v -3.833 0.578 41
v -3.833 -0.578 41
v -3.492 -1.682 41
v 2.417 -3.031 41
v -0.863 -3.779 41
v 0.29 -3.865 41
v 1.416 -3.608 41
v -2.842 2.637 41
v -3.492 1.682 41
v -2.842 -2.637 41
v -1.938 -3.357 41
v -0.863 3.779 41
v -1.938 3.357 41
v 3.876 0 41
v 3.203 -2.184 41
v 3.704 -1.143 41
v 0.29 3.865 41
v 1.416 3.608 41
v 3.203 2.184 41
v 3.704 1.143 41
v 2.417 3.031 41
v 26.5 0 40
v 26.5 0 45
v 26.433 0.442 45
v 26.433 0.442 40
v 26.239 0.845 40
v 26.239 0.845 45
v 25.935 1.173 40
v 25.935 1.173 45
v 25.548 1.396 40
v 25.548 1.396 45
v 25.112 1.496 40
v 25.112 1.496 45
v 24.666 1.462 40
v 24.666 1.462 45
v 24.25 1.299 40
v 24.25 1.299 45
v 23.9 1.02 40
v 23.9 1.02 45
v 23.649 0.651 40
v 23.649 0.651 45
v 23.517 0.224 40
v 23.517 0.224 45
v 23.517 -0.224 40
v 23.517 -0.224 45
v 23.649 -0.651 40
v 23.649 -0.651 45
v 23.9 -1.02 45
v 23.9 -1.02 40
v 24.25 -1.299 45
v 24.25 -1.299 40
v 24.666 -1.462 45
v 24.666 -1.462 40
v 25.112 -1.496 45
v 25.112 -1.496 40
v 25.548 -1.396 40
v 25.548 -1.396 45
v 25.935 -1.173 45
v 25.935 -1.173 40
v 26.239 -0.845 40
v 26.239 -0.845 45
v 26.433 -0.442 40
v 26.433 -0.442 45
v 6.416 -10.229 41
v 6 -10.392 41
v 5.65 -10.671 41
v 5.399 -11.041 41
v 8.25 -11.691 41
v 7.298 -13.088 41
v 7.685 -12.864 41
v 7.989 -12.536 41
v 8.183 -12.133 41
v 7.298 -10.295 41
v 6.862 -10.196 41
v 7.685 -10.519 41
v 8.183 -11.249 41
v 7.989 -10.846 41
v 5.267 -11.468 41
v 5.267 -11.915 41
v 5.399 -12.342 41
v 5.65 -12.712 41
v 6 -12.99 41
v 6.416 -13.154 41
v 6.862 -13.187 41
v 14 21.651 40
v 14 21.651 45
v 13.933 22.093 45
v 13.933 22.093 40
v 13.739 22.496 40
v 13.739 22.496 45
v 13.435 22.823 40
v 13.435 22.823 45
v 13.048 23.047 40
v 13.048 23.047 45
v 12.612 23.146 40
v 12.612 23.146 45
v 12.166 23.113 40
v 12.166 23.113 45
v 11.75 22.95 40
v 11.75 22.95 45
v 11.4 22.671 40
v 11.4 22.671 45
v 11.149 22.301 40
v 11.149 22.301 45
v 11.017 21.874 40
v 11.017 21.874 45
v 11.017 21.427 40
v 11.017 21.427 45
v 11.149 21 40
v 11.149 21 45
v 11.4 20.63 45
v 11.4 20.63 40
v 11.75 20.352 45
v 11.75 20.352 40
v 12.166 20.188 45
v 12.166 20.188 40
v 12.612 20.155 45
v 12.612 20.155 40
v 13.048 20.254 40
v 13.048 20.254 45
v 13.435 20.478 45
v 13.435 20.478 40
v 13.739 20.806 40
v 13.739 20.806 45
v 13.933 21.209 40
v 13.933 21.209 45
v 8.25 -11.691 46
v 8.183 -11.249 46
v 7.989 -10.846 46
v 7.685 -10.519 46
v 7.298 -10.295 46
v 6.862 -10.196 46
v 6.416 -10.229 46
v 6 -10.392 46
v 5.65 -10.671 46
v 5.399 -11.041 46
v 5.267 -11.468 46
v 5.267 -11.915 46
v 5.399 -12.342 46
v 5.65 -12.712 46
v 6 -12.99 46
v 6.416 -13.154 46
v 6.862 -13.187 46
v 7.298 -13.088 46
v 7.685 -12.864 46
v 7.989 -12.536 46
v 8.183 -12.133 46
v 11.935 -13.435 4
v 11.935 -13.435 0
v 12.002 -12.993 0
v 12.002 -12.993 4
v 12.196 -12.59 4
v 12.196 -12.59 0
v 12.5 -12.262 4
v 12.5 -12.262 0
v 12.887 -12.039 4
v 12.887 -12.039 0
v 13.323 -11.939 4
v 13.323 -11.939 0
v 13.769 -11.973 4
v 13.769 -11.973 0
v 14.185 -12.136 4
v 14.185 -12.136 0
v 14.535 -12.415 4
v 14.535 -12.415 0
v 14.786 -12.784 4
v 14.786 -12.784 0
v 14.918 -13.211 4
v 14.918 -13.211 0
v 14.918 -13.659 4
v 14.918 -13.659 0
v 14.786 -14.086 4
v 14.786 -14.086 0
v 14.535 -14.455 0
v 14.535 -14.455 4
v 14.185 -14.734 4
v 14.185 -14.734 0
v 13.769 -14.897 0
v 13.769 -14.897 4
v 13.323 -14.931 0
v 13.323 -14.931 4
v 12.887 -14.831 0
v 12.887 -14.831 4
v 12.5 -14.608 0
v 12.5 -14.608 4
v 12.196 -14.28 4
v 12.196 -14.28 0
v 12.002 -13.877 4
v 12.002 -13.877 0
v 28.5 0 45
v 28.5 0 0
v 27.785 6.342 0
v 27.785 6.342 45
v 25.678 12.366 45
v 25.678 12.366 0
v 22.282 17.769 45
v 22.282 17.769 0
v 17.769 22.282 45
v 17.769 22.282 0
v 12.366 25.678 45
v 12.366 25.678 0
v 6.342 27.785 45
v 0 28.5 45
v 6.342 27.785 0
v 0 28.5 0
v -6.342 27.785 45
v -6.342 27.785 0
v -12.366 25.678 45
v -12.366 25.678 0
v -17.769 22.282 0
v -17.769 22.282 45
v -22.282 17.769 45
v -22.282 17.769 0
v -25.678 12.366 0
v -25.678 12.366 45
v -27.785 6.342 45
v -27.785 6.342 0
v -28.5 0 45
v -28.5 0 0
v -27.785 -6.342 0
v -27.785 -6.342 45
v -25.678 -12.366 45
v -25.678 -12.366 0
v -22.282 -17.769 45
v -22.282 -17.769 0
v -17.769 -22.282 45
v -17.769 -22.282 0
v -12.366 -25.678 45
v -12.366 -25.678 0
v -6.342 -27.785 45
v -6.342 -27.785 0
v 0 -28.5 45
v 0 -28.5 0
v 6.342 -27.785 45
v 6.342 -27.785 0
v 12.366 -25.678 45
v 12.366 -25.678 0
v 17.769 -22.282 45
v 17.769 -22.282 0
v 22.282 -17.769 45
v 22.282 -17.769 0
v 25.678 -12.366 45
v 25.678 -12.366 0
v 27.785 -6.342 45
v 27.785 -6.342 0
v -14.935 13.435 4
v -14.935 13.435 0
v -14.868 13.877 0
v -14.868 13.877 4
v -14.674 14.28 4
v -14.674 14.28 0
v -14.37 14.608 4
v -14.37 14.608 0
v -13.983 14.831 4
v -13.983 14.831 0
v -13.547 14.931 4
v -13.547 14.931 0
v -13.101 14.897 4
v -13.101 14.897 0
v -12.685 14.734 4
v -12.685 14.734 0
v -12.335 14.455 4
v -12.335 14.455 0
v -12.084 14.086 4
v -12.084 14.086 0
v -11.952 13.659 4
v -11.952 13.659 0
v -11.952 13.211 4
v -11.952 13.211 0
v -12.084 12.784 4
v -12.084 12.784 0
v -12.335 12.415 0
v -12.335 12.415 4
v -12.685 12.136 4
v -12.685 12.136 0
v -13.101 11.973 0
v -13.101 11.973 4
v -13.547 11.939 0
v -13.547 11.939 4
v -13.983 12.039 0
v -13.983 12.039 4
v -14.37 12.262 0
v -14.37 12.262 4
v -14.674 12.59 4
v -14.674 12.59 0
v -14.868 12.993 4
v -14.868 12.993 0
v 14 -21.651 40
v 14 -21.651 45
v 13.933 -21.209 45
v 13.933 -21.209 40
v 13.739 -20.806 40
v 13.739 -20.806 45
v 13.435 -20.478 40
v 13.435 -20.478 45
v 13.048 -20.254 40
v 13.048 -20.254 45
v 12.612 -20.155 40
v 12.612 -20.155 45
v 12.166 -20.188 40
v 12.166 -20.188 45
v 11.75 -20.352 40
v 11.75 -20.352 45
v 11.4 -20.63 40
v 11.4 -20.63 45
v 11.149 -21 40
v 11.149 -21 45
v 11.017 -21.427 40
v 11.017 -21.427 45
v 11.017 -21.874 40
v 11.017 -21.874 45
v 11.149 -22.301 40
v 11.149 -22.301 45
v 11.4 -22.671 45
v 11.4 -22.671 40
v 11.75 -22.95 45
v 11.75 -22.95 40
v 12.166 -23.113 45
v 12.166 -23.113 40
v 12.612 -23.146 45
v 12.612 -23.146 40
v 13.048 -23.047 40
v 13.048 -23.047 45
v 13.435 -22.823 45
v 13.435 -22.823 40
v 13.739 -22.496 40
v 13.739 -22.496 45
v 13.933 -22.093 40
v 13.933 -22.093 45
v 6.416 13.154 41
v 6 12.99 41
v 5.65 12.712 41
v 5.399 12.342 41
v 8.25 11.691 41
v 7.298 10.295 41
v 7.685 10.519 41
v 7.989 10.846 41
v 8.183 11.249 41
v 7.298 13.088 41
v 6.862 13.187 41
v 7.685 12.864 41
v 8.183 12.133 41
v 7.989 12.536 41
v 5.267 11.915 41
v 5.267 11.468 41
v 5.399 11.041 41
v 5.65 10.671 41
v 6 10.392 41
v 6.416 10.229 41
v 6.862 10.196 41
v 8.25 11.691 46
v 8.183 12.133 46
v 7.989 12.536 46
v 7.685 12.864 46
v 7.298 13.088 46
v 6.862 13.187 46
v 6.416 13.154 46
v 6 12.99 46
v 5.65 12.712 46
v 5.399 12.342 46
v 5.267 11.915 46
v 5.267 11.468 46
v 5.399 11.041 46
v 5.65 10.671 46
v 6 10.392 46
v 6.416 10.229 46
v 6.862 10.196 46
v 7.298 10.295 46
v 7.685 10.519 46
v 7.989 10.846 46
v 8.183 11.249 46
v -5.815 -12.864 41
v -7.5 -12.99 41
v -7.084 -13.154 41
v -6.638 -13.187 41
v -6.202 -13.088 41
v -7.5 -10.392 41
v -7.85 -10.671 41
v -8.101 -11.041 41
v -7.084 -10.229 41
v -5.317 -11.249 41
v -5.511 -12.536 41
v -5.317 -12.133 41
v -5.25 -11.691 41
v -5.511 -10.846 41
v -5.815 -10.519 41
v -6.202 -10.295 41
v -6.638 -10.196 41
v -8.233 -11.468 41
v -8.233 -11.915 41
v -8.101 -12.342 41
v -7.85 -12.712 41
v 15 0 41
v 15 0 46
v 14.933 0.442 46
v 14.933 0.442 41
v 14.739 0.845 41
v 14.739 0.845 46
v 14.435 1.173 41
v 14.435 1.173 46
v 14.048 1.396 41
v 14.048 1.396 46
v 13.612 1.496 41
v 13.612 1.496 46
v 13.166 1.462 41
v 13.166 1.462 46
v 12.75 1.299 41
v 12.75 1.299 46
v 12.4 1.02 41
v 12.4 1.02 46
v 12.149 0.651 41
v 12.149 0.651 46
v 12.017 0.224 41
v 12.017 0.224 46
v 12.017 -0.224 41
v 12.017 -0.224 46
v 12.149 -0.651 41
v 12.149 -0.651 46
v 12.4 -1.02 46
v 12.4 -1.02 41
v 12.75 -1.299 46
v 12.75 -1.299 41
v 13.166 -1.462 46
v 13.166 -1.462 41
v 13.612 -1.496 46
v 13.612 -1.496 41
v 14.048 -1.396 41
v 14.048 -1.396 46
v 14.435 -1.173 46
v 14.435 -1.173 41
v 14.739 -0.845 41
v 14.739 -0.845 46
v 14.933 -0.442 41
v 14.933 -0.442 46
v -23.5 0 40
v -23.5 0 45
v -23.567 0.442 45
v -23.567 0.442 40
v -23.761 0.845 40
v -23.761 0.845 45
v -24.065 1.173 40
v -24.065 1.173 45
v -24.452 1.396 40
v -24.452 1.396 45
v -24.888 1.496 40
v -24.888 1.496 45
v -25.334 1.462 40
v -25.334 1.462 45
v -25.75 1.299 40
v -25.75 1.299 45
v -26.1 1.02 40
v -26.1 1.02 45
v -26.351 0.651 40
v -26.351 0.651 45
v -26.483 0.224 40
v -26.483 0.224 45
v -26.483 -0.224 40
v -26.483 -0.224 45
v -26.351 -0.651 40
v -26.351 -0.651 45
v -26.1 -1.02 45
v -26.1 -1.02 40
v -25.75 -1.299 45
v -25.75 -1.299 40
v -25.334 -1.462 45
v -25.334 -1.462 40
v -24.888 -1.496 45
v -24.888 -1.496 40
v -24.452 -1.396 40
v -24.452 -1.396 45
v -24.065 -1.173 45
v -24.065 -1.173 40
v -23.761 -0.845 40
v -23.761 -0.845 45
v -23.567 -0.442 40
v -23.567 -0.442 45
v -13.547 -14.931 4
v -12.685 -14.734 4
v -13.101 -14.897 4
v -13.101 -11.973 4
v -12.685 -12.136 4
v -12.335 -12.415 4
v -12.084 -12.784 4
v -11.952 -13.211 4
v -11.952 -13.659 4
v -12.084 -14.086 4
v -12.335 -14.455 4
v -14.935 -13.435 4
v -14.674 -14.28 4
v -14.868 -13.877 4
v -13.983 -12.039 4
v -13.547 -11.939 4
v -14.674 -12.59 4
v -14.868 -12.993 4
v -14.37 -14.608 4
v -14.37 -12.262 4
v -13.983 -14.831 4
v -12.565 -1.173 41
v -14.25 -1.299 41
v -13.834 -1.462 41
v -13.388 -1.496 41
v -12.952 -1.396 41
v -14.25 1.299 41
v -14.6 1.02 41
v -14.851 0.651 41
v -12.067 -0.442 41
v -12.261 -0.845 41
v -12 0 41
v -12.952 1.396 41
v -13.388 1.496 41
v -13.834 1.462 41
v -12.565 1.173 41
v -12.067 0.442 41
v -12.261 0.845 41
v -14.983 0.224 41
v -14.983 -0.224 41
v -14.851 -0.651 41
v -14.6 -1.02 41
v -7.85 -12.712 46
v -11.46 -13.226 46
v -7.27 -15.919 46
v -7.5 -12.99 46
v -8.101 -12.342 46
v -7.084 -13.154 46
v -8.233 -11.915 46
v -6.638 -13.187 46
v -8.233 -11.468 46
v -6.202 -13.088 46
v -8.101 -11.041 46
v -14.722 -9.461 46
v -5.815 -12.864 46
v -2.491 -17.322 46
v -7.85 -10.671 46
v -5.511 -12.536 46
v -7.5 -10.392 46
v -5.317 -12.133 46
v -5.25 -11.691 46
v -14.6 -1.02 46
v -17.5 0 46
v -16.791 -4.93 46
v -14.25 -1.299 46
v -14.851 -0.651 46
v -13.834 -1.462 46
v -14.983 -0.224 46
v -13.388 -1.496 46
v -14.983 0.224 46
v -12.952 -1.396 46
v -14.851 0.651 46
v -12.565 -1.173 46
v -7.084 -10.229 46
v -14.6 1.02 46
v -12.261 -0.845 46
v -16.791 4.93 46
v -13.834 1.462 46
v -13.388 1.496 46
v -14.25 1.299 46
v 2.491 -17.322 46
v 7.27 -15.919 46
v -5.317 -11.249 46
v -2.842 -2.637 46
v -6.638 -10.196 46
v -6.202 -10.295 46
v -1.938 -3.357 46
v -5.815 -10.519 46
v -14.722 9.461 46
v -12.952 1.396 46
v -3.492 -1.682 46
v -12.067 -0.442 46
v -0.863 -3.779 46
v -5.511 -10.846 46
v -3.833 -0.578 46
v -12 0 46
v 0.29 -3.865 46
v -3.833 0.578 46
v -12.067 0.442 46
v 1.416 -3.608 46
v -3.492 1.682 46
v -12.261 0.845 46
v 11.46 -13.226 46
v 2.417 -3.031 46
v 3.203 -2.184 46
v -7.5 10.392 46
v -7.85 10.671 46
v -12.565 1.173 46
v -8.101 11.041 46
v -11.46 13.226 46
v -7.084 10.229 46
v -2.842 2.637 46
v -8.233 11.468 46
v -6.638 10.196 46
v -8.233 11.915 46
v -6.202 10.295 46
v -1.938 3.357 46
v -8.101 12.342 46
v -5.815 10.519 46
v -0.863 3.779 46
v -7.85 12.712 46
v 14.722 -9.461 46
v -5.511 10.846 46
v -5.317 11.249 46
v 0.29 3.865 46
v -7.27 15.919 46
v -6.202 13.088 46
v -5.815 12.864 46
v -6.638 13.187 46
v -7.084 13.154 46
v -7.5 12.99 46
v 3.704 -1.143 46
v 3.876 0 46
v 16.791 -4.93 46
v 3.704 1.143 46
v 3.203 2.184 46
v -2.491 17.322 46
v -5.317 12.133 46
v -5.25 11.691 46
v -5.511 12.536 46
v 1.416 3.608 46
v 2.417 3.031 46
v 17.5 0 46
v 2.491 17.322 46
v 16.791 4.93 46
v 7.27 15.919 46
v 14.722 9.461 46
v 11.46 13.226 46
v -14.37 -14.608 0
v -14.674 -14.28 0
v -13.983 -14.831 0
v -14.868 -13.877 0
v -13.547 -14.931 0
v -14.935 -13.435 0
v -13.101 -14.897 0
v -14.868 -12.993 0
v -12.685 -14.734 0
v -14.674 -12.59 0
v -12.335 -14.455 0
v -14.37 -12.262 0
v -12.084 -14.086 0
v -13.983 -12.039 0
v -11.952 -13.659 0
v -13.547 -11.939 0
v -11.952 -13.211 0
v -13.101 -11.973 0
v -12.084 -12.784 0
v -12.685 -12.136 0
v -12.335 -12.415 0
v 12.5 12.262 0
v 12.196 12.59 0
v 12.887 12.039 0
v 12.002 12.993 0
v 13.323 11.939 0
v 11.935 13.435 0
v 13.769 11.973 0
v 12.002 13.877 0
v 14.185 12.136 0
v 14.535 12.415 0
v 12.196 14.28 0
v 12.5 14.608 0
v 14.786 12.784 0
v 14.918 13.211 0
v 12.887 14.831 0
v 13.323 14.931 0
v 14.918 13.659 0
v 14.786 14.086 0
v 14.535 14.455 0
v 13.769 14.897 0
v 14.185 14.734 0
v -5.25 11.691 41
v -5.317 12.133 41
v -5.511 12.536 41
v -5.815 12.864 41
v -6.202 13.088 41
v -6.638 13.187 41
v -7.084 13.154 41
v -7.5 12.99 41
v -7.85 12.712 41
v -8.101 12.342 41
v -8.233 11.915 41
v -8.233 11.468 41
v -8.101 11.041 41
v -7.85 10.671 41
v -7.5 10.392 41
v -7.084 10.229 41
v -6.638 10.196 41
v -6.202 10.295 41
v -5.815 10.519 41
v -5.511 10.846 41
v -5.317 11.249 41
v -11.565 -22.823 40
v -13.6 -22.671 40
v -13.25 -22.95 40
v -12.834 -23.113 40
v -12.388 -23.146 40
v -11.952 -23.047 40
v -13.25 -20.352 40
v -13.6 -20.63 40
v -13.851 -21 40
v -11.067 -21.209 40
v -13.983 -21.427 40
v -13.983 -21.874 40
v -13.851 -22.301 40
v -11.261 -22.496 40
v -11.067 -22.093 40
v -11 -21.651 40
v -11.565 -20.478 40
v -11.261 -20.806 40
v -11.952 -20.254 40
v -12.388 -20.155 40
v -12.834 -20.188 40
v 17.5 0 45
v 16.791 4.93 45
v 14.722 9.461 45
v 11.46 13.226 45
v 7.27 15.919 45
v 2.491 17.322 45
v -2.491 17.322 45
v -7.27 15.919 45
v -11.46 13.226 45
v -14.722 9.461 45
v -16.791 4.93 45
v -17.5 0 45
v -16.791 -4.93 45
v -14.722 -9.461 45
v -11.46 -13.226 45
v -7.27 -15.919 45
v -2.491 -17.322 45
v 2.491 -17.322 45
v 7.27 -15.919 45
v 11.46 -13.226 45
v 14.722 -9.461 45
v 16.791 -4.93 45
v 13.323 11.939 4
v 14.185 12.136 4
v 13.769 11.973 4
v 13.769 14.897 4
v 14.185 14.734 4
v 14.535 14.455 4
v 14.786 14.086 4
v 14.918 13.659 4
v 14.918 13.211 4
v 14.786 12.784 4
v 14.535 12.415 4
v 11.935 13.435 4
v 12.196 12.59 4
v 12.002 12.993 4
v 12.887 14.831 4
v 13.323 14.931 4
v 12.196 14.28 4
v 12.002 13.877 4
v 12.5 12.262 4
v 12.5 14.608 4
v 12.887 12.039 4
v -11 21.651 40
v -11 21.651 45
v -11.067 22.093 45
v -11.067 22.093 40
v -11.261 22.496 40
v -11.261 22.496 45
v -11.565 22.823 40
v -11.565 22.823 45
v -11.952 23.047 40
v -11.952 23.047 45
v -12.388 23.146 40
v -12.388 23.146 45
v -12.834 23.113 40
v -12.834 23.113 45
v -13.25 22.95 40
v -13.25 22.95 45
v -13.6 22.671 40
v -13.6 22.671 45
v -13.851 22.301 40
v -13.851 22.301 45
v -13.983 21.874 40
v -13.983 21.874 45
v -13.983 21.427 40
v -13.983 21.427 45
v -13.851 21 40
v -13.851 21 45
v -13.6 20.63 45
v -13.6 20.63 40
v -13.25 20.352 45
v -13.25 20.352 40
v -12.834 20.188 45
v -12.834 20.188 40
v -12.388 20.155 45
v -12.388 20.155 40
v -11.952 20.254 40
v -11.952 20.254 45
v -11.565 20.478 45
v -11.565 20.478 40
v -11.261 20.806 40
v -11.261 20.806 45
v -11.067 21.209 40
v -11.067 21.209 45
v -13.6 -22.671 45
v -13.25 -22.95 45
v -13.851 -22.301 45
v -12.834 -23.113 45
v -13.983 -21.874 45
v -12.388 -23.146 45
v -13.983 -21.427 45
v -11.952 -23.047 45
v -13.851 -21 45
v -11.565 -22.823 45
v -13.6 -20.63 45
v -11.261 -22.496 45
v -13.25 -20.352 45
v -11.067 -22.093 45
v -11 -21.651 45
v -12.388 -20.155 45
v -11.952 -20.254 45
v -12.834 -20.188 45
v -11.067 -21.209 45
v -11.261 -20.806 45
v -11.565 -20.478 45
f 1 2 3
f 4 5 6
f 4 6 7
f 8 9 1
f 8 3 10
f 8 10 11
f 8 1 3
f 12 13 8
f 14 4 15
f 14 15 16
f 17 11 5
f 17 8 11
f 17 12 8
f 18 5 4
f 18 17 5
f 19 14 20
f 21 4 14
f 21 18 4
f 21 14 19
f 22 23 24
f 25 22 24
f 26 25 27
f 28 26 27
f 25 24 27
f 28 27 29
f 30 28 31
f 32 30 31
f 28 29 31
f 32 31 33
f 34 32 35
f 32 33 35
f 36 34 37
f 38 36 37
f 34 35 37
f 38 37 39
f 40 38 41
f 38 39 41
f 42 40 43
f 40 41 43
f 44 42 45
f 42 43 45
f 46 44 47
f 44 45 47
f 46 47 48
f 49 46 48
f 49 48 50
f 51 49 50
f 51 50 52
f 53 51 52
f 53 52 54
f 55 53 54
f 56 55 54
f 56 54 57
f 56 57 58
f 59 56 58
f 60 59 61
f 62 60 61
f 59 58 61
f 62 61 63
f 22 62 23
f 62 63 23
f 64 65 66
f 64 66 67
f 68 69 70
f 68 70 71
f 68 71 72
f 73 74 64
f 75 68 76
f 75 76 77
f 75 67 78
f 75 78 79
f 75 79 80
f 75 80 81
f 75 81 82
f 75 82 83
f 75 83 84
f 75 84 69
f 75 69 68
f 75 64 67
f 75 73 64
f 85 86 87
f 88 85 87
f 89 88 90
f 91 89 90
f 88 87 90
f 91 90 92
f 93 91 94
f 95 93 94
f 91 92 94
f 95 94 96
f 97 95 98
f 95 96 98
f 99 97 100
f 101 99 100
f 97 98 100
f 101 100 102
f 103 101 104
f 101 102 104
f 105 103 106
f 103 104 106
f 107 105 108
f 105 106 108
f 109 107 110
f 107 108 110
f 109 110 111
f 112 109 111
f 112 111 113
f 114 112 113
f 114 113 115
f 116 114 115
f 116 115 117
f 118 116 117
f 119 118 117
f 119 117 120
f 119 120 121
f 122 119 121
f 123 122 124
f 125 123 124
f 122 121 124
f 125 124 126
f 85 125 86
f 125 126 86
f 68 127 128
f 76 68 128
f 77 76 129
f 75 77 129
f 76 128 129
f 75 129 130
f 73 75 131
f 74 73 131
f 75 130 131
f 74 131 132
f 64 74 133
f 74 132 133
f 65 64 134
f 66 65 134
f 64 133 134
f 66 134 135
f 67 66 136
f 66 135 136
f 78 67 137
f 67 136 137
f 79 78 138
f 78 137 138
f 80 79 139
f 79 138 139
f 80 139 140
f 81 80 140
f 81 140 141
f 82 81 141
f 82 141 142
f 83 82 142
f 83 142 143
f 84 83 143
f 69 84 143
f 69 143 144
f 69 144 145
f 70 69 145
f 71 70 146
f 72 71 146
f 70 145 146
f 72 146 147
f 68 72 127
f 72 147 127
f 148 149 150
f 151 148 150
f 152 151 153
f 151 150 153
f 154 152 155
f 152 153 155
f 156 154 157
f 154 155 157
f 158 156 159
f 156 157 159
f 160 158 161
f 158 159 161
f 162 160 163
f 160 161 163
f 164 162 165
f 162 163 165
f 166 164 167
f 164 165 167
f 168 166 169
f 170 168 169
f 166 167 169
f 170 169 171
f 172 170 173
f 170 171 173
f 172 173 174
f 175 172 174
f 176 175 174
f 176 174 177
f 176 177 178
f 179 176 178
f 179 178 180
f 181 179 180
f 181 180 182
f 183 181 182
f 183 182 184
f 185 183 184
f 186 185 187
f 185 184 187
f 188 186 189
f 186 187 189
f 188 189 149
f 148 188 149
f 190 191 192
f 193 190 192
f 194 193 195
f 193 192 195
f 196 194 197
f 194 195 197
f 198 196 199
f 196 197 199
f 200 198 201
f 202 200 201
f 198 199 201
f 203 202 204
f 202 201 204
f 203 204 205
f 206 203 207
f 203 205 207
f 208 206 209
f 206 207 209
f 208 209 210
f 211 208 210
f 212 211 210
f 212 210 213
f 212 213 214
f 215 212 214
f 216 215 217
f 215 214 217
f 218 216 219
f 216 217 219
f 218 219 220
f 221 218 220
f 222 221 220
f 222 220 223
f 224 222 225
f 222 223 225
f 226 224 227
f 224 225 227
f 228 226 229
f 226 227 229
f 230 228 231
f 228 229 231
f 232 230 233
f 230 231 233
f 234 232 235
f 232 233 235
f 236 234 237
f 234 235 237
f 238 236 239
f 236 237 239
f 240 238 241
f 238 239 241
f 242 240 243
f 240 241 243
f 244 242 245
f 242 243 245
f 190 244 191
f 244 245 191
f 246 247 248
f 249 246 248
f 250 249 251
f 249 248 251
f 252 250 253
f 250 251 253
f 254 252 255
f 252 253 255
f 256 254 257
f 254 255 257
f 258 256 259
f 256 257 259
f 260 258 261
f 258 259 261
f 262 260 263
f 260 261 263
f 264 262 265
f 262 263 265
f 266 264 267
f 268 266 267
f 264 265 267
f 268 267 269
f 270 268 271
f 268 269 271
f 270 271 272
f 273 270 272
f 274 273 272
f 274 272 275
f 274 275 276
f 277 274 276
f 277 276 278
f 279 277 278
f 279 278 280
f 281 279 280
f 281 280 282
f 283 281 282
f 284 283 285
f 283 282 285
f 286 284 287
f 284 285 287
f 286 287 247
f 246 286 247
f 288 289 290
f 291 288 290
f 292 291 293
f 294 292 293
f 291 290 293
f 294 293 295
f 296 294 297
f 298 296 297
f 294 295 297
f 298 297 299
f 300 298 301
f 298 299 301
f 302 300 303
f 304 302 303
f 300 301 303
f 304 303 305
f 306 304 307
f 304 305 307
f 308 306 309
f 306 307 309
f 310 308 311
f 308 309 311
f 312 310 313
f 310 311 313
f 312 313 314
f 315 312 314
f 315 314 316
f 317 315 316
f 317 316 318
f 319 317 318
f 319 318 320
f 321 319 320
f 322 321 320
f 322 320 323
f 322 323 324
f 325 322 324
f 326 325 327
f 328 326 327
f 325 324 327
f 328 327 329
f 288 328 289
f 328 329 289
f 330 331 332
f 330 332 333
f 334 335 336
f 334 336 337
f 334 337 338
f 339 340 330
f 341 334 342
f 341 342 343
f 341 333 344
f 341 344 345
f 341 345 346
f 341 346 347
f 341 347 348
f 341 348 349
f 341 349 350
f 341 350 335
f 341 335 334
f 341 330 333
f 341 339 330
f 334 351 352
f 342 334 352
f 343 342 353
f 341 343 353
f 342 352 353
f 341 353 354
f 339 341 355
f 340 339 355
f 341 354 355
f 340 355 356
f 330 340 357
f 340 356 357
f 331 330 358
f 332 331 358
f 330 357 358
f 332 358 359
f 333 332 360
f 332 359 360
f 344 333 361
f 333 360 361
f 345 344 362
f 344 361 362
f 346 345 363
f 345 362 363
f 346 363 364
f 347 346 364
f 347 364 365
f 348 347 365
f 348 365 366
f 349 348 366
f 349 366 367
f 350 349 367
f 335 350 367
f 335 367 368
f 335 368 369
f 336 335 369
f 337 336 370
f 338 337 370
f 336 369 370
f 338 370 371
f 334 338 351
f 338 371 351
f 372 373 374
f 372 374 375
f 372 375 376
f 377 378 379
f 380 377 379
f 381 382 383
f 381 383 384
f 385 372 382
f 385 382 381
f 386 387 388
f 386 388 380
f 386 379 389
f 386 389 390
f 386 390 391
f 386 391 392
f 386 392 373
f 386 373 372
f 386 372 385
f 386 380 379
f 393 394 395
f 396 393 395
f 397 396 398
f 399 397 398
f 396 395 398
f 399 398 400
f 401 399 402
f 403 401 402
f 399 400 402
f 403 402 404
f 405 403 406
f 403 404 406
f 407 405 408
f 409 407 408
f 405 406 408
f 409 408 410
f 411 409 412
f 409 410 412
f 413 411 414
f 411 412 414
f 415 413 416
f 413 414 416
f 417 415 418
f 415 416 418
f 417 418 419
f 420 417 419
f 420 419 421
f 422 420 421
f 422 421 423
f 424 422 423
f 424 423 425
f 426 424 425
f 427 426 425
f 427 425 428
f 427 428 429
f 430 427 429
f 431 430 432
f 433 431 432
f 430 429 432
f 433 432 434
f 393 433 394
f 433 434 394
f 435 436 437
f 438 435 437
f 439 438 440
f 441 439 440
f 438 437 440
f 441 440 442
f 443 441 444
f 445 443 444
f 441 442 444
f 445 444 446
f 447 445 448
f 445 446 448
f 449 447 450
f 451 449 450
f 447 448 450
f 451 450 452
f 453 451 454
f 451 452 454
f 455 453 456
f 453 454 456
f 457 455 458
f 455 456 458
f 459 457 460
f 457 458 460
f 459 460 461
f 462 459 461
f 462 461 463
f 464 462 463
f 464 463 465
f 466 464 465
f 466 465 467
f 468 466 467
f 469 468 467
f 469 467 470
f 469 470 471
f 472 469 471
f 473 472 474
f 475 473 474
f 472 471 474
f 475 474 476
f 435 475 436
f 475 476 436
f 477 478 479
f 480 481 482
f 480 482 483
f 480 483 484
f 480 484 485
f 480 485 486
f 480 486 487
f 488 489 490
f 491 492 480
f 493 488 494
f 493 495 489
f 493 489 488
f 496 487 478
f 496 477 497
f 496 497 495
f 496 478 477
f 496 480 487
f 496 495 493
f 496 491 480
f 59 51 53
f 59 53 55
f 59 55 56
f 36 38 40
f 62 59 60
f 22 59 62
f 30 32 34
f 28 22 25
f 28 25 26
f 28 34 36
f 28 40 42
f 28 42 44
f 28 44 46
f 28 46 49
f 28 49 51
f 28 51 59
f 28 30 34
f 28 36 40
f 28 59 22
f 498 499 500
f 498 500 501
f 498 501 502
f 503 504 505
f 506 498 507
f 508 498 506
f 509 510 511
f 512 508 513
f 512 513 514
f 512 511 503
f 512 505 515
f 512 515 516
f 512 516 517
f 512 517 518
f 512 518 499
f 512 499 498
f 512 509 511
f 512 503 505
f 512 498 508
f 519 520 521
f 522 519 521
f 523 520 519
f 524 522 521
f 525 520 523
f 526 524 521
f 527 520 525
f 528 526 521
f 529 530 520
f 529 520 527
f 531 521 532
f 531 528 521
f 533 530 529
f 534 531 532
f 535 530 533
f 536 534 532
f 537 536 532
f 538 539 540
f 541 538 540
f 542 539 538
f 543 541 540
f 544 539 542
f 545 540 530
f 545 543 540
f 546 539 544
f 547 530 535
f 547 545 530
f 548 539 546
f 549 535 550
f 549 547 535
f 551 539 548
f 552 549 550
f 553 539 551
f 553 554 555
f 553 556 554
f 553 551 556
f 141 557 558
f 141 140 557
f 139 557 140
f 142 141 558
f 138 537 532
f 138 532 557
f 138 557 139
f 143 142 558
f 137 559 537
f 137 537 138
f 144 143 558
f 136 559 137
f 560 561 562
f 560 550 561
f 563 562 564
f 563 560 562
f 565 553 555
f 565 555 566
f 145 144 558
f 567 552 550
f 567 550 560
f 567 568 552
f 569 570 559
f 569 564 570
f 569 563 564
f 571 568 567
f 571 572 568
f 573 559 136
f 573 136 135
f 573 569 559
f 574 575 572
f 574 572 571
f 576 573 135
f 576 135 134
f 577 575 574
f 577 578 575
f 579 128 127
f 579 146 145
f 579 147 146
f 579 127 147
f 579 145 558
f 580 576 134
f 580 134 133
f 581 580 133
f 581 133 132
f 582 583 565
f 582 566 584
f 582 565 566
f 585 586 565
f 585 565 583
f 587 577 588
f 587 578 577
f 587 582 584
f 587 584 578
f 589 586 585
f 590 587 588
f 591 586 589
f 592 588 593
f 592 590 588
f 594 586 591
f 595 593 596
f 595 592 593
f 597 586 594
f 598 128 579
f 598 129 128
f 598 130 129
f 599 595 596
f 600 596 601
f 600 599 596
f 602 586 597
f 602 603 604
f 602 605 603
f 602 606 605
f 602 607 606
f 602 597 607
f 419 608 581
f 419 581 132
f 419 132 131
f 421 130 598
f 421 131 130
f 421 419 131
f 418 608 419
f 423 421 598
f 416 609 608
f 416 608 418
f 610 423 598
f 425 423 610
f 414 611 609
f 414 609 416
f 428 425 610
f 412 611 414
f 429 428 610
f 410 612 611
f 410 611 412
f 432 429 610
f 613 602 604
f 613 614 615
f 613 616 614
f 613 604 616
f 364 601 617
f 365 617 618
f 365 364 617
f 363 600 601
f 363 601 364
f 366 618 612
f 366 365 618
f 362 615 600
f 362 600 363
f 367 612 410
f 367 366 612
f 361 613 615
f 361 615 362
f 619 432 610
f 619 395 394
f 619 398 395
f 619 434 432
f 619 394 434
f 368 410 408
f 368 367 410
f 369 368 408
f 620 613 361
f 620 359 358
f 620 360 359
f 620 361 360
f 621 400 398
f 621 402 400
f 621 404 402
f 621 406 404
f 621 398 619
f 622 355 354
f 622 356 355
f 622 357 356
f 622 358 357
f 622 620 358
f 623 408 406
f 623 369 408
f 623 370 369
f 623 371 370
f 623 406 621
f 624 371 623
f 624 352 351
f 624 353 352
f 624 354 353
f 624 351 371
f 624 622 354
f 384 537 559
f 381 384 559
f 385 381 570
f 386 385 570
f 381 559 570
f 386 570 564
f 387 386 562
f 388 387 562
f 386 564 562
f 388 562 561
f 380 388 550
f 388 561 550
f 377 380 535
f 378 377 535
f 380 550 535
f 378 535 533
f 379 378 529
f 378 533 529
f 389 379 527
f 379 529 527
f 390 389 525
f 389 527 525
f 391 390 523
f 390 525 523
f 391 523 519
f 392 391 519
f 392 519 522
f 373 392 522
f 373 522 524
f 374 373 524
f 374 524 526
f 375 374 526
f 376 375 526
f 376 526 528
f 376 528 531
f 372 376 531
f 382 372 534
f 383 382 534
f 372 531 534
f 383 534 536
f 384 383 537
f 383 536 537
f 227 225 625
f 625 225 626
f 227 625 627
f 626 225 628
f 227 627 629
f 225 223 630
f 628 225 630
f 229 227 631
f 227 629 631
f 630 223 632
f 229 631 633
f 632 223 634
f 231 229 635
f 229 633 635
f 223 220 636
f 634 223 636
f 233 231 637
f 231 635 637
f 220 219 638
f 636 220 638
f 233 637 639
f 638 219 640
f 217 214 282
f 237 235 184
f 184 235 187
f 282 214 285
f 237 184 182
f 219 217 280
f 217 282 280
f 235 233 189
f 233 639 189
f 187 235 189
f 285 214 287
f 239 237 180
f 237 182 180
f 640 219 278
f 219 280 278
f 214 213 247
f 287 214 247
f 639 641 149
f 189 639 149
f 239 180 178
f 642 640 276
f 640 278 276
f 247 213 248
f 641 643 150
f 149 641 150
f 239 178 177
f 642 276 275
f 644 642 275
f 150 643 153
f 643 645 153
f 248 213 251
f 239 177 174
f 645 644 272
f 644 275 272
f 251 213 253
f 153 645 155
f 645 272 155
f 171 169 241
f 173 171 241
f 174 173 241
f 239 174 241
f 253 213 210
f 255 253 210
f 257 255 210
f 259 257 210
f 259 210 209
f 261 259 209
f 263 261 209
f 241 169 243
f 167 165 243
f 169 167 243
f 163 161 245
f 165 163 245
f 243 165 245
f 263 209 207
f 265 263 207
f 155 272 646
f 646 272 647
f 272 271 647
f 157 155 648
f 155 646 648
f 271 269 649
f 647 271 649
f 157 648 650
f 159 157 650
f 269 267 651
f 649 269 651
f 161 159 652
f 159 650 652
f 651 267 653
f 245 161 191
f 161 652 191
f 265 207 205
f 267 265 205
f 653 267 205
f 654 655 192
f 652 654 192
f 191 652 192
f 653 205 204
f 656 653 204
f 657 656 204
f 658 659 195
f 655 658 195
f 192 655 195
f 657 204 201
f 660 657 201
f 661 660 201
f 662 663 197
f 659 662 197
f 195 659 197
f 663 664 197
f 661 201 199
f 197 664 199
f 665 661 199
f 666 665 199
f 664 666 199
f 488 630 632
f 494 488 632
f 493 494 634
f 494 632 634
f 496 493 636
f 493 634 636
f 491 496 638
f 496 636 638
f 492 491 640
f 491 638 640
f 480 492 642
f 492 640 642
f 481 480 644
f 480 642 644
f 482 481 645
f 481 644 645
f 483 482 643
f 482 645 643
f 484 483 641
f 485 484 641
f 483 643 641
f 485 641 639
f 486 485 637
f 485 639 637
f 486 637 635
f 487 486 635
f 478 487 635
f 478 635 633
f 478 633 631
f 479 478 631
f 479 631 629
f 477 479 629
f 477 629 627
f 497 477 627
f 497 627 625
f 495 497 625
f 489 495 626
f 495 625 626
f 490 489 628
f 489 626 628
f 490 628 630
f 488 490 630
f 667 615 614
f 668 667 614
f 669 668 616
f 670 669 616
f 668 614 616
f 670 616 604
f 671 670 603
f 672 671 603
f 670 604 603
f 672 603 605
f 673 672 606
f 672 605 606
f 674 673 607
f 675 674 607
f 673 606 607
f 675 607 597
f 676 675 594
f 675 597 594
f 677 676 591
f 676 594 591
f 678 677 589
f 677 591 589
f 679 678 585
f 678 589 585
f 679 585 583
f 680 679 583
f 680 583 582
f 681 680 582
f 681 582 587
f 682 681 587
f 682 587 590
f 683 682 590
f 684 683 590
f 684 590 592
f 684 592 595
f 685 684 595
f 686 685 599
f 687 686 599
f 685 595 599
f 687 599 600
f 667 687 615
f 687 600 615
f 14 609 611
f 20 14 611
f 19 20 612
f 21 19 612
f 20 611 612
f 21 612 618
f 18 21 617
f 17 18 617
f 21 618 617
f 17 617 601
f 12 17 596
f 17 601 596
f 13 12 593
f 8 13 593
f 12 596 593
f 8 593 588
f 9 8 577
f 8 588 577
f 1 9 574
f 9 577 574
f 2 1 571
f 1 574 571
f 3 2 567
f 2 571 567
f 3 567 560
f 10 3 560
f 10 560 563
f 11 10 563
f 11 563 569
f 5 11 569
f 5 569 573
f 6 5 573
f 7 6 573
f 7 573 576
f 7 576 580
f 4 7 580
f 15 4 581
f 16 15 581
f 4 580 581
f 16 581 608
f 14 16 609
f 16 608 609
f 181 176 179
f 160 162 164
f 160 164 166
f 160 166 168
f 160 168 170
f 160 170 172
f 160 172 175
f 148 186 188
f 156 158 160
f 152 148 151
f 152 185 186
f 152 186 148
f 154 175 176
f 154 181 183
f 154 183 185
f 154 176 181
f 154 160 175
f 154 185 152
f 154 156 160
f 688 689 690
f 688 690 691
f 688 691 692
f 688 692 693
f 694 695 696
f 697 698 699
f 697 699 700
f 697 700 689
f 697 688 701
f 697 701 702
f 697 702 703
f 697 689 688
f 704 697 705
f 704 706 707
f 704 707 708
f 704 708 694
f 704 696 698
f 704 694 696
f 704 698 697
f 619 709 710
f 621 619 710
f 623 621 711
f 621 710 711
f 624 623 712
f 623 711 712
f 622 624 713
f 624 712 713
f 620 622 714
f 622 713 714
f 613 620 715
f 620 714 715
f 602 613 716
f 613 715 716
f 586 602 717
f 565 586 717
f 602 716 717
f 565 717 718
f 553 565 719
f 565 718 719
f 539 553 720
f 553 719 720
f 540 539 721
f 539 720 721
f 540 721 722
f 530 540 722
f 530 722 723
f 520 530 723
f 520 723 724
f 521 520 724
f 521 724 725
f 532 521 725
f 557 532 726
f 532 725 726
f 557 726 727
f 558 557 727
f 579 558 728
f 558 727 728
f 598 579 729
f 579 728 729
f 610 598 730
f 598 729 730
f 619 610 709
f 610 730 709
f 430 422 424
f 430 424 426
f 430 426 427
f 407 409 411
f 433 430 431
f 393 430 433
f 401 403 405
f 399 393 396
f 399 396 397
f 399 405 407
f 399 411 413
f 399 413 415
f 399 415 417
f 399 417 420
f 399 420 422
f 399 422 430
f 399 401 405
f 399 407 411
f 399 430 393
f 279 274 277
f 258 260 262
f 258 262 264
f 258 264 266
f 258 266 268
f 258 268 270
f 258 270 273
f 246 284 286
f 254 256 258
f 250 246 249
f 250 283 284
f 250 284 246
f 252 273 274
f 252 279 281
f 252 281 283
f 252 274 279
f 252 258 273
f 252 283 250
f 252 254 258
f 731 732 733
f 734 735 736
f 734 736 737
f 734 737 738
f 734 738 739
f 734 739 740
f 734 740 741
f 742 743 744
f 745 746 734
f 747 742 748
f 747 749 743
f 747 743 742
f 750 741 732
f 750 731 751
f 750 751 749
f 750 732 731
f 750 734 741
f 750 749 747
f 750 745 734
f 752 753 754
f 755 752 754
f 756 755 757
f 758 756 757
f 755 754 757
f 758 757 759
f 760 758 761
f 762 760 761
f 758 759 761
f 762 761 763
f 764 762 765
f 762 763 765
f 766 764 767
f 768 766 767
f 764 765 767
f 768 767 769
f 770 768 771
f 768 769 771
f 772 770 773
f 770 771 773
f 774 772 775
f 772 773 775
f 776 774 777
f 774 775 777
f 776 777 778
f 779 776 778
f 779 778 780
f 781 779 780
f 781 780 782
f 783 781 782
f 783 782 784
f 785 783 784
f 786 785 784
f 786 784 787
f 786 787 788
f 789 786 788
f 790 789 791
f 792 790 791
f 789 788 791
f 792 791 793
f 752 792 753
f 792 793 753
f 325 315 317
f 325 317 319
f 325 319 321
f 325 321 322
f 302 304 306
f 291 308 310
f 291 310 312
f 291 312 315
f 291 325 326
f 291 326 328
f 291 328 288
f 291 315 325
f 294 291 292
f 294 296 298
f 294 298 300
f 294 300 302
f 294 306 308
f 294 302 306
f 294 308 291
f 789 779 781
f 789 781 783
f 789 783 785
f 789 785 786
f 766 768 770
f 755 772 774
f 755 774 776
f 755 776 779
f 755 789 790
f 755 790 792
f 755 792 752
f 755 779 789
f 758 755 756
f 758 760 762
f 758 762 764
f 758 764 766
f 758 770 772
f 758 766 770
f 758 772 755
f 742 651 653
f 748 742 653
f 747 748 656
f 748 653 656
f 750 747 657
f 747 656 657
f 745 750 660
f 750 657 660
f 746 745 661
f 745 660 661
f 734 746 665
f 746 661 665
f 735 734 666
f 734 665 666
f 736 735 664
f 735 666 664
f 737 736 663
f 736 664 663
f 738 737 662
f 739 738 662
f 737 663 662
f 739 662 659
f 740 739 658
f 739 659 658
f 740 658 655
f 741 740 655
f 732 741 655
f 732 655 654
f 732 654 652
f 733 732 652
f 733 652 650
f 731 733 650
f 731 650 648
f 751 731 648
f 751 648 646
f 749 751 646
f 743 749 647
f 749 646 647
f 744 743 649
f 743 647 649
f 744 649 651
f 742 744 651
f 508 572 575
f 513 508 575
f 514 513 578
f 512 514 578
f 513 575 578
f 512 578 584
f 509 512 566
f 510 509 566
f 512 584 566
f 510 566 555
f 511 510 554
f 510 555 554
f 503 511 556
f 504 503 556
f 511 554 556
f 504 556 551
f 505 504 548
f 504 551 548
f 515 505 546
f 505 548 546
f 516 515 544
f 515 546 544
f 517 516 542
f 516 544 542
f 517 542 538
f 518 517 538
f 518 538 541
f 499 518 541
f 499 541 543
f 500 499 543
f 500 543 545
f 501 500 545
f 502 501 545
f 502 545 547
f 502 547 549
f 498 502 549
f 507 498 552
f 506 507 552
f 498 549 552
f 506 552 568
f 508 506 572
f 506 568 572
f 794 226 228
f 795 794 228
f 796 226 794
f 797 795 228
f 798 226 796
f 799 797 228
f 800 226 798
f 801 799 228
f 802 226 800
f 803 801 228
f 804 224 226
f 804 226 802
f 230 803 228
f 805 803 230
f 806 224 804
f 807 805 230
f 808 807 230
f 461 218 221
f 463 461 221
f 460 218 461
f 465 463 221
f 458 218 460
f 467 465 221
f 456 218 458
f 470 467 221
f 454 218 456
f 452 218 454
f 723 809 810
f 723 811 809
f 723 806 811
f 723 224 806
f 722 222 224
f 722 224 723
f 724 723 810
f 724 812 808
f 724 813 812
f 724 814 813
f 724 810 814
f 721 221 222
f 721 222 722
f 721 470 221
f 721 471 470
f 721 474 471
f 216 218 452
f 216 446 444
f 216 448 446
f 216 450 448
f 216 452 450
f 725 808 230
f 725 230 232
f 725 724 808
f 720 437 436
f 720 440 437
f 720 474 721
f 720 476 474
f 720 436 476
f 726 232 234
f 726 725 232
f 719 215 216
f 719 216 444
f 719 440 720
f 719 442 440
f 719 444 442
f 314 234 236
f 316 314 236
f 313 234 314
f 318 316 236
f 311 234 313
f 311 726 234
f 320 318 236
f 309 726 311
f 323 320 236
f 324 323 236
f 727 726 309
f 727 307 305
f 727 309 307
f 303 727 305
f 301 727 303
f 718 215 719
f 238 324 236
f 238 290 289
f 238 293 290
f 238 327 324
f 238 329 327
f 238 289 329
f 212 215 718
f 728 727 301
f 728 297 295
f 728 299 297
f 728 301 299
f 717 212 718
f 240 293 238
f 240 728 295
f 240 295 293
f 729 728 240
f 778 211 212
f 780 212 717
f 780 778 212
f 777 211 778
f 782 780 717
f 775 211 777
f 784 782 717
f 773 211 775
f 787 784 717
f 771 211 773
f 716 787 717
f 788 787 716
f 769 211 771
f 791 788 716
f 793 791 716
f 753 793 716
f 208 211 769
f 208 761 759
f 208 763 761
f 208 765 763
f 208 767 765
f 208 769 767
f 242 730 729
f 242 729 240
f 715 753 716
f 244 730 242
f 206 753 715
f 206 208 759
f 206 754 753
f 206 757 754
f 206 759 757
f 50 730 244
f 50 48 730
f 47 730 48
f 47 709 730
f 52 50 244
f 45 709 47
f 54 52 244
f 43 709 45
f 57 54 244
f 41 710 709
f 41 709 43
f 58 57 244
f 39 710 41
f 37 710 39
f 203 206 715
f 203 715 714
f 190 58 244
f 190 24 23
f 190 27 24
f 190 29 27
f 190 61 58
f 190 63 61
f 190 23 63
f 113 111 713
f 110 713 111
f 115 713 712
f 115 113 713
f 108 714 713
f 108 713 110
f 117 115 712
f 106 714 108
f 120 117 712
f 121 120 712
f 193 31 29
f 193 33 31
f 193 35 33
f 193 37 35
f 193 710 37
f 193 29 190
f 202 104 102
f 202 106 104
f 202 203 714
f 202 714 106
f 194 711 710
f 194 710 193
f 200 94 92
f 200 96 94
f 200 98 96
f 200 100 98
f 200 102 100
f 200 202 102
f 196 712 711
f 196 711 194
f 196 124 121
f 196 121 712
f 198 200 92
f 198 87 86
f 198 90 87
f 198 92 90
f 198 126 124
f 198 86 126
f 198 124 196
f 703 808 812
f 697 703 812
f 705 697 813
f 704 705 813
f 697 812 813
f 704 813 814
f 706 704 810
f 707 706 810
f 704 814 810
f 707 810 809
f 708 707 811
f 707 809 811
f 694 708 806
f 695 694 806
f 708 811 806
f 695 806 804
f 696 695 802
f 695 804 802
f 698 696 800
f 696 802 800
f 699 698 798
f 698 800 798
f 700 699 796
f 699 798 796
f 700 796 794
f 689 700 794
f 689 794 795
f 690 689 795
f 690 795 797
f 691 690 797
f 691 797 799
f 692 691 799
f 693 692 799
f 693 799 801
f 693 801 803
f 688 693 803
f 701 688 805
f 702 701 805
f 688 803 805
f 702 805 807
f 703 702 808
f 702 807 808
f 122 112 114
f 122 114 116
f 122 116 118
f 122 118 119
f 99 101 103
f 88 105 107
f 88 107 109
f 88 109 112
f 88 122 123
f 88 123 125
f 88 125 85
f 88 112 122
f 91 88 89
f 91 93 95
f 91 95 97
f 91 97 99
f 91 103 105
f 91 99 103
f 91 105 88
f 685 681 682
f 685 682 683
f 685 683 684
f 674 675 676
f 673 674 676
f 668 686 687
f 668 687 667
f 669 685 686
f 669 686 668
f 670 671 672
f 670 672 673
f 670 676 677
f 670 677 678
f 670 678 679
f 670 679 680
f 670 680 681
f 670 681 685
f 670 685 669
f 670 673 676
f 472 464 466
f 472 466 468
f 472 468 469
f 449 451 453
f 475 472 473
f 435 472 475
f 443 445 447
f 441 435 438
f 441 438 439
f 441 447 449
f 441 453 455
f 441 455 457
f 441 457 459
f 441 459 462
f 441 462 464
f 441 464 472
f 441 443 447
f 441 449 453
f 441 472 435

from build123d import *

# Parameters (mm, degrees)
SKETCH_1_R          = 28.5
EXTRUDE_1_DEPTH     = 45
SKETCH_2_R          = 1.5
CUT_EXTRUDE_1_DEPTH = 4
SKETCH_3_R          = 1.5
CUT_EXTRUDE_2_DEPTH = 5
SKETCH_4_R          = 17.5
EXTRUDE_2_DEPTH     = 1
SKETCH_5_R          = 1.5
SKETCH_5_R_2        = 3.876309497
CUT_EXTRUDE_3_DEPTH = 5


with BuildPart() as part:
    # 草图1 → 凸台-拉伸1 (new body)
    with BuildSketch(Plane.XY):
        Circle(SKETCH_1_R)
    extrude(amount=EXTRUDE_1_DEPTH)

    # 草图2 → 切除-拉伸1 (cut)
    with BuildSketch(Plane(origin=(0, 0, 0), x_dir=(-1, 0, 0), z_dir=(0, 0, -1))):
        with Locations((13.435028843, -13.435028843)):
            Circle(SKETCH_2_R)
        with Locations((-13.435028843, -13.435028843)):
            Circle(SKETCH_2_R)
        with Locations((-13.435028843, 13.435028843)):
            Circle(SKETCH_2_R)
        with Locations((13.435028843, 13.435028843)):
            Circle(SKETCH_2_R)
    extrude(amount=-CUT_EXTRUDE_1_DEPTH, mode=Mode.SUBTRACT)

    # 草图3 → 切除-拉伸2 (cut)
    with BuildSketch(Plane.XY.offset(45)):
        with Locations((-12.5, -21.650635095)):
            Circle(SKETCH_3_R)
        with Locations((-12.5, 21.650635095)):
            Circle(SKETCH_3_R)
        with Locations((12.5, 21.650635095)):
            Circle(SKETCH_3_R)
        with Locations((12.5, -21.650635095)):
            Circle(SKETCH_3_R)
        with Locations((-25, 0)):
            Circle(SKETCH_3_R)
        with Locations((25, 0)):
            Circle(SKETCH_3_R)
    extrude(amount=-CUT_EXTRUDE_2_DEPTH, mode=Mode.SUBTRACT)

    # 草图4 → 凸台-拉伸2 (add)
    with BuildSketch(Plane.XY.offset(45)):
        Circle(SKETCH_4_R)
    extrude(amount=EXTRUDE_2_DEPTH)

    # 草图5 → 切除-拉伸3 (cut)
    with BuildSketch(Plane.XY.offset(46)):
        with Locations((13.5, 0)):
            Circle(SKETCH_5_R)
        with Locations((-13.5, 0)):
            Circle(SKETCH_5_R)
        with Locations((6.75, 11.691342951)):
            Circle(SKETCH_5_R)
        with Locations((-6.75, 11.691342951)):
            Circle(SKETCH_5_R)
        with Locations((-6.75, -11.691342951)):
            Circle(SKETCH_5_R)
        with Locations((6.75, -11.691342951)):
            Circle(SKETCH_5_R)
        Circle(SKETCH_5_R_2)
    extrude(amount=-CUT_EXTRUDE_3_DEPTH, mode=Mode.SUBTRACT)


solid = part.part
